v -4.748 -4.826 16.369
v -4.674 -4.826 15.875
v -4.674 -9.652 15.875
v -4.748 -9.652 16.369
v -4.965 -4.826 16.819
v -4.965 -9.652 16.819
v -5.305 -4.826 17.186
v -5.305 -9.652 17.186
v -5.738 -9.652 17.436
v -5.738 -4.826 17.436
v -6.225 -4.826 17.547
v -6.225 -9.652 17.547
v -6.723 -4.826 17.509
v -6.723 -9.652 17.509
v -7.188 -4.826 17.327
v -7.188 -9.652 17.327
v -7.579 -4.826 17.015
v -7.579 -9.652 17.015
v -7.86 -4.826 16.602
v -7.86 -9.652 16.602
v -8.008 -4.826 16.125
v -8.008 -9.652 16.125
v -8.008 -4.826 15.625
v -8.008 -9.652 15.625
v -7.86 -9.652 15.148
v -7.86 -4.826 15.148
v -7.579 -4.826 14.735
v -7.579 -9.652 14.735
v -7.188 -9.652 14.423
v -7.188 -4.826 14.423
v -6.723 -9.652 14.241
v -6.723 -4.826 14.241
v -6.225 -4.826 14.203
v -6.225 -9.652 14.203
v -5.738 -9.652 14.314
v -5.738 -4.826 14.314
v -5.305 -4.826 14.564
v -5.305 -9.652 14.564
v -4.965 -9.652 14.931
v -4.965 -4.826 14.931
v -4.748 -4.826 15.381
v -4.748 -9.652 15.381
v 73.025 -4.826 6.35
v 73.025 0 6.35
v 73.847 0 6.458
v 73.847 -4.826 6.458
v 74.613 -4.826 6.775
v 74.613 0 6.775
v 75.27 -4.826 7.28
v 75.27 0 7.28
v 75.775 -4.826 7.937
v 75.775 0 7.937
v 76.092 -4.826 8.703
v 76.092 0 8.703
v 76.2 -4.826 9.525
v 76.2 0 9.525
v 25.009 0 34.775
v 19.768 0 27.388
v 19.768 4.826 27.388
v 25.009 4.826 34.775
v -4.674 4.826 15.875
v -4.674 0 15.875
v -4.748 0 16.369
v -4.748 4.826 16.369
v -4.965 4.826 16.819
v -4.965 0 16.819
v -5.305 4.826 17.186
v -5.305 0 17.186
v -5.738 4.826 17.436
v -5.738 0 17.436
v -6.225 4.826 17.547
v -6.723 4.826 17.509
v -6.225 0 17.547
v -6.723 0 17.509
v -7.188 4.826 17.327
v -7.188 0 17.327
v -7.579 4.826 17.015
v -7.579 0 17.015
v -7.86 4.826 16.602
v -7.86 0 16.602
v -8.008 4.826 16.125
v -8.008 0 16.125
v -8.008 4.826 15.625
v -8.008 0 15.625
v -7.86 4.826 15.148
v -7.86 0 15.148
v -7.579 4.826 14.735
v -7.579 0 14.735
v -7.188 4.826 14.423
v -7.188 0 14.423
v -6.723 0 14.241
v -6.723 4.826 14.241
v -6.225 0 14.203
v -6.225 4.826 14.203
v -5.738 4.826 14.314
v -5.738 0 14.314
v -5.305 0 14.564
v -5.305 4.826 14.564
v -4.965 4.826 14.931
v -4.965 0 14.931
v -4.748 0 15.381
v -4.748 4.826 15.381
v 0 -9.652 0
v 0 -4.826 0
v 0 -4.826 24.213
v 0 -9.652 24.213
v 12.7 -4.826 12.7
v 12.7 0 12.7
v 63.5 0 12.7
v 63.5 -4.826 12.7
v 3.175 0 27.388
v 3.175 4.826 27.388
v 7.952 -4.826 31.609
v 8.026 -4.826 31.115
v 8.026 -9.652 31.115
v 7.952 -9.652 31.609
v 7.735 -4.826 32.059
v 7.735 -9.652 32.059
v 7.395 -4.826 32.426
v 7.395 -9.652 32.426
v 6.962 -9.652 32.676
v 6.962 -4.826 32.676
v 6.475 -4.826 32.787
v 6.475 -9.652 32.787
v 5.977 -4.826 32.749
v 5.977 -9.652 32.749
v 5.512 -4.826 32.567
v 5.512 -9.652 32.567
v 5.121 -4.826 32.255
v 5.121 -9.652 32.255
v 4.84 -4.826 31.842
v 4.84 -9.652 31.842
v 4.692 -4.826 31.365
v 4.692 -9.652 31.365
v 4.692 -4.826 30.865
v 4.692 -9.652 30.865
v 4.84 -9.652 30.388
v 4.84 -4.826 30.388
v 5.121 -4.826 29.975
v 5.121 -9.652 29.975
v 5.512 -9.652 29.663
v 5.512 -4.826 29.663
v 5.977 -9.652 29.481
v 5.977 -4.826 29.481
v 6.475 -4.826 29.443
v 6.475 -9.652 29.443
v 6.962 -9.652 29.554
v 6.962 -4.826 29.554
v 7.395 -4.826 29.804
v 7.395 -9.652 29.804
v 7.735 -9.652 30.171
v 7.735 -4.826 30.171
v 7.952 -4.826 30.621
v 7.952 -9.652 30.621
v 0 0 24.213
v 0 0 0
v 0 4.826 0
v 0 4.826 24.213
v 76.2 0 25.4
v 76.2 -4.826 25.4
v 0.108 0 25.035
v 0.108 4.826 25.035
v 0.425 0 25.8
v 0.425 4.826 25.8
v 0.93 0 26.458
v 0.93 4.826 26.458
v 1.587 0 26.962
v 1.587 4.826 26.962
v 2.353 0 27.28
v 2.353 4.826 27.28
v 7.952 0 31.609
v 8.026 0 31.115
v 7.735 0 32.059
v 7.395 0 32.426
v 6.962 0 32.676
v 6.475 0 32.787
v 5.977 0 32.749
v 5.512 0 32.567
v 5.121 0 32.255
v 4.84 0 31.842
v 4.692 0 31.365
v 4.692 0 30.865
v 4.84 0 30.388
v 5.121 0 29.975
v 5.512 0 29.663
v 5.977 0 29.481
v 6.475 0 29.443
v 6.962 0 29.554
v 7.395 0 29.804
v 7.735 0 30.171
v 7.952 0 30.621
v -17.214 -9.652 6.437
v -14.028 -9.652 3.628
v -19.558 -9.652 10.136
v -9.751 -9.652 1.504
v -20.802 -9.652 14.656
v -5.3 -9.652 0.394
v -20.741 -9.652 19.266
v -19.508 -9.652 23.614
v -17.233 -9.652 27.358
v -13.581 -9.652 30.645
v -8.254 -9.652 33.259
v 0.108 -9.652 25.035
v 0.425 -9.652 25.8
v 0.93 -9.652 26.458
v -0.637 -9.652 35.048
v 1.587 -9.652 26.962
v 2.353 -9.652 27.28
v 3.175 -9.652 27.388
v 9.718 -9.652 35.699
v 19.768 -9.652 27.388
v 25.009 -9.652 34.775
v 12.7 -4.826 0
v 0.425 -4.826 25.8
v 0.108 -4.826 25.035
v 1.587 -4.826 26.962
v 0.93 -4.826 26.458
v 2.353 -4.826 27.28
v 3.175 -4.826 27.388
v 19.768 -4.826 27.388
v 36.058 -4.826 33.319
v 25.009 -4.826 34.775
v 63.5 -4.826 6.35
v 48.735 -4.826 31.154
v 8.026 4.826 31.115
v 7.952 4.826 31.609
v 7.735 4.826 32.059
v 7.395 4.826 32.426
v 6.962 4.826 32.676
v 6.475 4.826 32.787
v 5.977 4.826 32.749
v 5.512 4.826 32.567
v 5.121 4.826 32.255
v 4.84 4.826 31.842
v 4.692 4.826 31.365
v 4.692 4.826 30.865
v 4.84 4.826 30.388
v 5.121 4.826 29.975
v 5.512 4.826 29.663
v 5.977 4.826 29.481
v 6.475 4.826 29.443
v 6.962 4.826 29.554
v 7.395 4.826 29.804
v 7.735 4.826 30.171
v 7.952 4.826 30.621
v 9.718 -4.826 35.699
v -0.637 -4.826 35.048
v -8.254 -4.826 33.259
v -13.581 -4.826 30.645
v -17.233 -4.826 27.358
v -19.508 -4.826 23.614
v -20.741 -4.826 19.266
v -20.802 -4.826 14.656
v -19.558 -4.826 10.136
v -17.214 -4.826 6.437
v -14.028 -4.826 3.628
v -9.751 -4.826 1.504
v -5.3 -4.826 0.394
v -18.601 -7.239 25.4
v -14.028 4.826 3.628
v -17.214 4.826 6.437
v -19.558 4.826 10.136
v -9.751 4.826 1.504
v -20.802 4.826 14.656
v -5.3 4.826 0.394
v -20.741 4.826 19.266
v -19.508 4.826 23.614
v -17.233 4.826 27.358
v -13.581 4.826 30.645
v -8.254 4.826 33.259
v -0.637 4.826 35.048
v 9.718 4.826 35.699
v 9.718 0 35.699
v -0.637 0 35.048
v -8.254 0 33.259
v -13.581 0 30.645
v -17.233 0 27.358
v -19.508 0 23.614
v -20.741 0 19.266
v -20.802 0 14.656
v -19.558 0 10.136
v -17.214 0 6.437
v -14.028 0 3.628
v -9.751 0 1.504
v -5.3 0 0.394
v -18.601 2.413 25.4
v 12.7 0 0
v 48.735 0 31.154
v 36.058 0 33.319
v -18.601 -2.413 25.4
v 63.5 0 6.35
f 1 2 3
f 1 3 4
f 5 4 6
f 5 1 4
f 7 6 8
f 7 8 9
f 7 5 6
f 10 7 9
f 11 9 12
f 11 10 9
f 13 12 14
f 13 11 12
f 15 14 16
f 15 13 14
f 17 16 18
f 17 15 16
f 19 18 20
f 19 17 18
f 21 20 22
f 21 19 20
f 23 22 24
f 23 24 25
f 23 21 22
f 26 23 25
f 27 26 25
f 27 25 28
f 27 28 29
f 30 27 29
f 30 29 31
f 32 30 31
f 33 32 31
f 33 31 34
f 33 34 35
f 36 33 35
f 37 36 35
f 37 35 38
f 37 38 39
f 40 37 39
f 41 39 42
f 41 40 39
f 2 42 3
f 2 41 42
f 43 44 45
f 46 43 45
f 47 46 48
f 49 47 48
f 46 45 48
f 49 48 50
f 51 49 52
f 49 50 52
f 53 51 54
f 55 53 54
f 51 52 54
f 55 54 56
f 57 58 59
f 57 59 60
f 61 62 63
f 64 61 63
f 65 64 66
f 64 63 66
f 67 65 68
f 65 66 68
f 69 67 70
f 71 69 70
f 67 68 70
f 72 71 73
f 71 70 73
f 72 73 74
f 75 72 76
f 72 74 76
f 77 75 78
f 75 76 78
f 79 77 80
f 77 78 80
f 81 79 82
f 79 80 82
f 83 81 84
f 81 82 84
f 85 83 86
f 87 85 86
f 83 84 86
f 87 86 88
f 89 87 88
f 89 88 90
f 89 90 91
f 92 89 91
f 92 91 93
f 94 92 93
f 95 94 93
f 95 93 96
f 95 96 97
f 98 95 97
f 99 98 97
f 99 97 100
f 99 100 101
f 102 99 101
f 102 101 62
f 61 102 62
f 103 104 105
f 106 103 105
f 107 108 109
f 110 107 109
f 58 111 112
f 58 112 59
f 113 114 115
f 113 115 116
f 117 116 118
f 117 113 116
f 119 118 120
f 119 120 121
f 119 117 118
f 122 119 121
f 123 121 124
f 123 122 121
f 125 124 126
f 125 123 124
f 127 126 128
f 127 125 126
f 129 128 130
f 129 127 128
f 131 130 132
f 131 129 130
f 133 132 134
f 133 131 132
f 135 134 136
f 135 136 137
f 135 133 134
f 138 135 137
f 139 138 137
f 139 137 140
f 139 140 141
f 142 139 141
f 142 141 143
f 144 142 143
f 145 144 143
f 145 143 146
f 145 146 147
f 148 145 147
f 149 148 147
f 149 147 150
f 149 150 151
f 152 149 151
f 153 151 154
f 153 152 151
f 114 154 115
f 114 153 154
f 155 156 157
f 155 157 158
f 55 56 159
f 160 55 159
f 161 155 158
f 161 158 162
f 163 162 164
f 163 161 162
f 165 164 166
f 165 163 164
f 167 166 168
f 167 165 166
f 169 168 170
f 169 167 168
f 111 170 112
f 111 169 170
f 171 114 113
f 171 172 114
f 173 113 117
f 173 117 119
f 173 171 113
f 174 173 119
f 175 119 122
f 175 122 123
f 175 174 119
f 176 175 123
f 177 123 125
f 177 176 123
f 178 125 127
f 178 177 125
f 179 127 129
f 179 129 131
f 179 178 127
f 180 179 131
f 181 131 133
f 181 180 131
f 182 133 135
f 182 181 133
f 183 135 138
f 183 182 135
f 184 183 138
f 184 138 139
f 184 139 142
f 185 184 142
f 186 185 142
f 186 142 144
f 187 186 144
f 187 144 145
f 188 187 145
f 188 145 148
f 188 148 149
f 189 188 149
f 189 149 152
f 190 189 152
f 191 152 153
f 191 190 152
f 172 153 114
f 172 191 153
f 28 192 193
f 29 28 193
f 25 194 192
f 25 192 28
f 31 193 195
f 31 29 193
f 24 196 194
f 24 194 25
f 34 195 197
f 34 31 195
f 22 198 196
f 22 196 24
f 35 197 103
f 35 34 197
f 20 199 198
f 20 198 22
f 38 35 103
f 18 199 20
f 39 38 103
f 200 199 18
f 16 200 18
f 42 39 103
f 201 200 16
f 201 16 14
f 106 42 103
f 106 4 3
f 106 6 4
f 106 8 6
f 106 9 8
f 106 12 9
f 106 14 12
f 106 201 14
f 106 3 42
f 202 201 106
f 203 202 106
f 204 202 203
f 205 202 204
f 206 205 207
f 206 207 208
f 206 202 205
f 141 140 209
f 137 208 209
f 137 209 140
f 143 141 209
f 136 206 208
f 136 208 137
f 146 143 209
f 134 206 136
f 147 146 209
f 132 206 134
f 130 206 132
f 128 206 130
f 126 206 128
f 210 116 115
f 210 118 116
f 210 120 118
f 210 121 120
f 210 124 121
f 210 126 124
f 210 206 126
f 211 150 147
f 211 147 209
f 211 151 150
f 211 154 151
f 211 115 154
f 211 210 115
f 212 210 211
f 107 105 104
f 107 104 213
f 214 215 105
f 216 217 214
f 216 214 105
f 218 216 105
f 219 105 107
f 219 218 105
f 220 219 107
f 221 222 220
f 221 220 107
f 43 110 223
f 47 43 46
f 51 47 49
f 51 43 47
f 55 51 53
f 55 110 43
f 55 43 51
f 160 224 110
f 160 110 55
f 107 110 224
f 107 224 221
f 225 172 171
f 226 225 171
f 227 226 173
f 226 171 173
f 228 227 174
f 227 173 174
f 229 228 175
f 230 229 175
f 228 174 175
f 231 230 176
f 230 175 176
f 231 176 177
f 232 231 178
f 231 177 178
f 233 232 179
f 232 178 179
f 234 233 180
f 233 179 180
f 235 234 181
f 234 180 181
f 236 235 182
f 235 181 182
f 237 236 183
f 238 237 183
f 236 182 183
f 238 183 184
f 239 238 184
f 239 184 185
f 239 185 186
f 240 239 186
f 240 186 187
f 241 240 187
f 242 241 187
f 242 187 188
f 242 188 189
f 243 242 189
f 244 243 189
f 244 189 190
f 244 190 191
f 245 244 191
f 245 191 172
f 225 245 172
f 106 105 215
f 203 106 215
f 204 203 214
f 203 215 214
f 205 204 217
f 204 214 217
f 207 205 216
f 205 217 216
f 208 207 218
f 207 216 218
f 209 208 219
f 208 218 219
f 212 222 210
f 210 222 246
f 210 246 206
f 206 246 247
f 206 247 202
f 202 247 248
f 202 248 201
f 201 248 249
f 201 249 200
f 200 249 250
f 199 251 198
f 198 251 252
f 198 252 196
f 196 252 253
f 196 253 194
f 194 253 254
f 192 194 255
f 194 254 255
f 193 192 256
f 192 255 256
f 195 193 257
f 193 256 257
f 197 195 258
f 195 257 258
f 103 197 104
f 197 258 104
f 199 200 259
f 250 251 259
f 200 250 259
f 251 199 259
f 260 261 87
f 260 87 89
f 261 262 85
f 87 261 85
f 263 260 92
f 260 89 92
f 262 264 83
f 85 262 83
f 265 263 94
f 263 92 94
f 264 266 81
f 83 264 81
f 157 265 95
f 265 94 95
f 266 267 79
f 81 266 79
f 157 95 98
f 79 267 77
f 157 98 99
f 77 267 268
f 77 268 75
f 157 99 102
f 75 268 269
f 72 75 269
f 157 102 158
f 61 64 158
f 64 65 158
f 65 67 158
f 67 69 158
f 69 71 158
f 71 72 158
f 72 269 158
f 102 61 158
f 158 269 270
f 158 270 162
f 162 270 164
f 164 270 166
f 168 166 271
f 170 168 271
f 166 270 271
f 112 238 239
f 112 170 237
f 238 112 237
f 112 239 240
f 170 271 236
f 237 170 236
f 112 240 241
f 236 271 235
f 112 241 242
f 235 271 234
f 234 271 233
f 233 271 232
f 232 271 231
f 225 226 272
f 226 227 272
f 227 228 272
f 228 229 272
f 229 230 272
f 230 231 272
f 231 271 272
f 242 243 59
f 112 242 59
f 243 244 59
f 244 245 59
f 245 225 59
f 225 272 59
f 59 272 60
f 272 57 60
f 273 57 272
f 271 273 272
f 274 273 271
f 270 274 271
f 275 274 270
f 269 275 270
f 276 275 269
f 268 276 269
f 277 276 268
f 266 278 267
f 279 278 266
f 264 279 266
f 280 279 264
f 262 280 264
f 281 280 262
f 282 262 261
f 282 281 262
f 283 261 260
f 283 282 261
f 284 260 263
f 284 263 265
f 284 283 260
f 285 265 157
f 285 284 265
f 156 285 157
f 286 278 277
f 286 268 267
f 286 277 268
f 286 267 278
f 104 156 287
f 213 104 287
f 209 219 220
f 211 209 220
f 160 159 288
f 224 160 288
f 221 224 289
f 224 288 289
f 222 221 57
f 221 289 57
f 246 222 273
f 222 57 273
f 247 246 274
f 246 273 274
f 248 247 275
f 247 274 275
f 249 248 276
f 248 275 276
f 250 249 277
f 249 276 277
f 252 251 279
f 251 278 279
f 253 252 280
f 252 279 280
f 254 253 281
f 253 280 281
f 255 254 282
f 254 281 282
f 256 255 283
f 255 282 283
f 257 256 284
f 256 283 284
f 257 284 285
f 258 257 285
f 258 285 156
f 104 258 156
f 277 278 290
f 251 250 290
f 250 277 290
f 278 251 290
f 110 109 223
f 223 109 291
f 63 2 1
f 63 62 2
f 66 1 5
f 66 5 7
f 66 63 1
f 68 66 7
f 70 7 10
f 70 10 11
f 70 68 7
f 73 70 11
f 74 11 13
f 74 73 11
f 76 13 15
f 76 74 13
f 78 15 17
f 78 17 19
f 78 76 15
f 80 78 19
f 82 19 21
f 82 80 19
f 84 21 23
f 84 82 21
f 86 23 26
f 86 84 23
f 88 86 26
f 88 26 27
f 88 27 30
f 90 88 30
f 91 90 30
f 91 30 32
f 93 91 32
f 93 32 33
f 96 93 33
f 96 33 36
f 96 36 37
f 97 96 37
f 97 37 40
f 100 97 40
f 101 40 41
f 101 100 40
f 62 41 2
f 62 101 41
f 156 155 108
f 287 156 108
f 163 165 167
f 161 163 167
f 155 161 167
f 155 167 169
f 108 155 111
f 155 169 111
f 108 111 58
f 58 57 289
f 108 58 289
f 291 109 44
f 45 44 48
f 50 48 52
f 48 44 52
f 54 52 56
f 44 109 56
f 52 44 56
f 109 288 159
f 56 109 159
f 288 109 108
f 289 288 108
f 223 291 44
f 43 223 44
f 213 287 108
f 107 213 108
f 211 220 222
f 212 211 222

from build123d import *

# Parameters (mm, degrees)
F0_R          = 1.6764
F1_DEPTH      = 4.826
F2_R          = 1.6764
F3_DEPTH      = 4.826
F3_DEPTH_BACK = 9.652


with BuildPart() as f1:
    # F0 (on Front) → F1 (new body)
    with BuildSketch(Plane.XZ):
        with BuildLine():
            Line((0, 25.4), (0, 0))
            Line((0, 0), (12.7, 0))
            Line((12.7, 0), (12.7, 12.7))
            Line((12.7, 12.7), (63.5, 12.7))
            Line((63.5, 12.7), (63.5, 6.35))
            Line((63.5, 6.35), (73.025, 6.35))
            ThreePointArc((73.025, 6.35), (75.2700640303, 7.2799359697), (76.2, 9.525))
            Line((76.2, 9.525), (76.2, 25.4))
            Line((76.2, 25.4), (0, 25.4))
        make_face()
        with BuildLine():
            add(Edge.make_bspline(
                [(76.2, 25.4), (26.6581273418, 36.622909108), (-29.7852053598, 44.2043974935), (-20.7405121115, 0), (0, 0)],
                knots=[0, 0, 0, 0, 0.6344075171, 1, 1, 1, 1], degree=3))
            Line((0, 0), (0, 25.4))
            Line((0, 25.4), (76.2, 25.4))
        make_face()
        with Locations((-6.35, 15.875)):
            Circle(F0_R, mode=Mode.SUBTRACT)
        with Locations((6.35, 31.115)):
            Circle(F0_R, mode=Mode.SUBTRACT)
    extrude(amount=F1_DEPTH)

    # F2 (on face) → F3 (join, two sides)
    with BuildSketch(Plane.XZ.offset(4.826)) as f3_sk:
        with BuildLine():
            Line((3.175, 27.3878005167), (19.7676480954, 27.3878005167))
            Line((19.7676480954, 27.3878005167), (25.0090726158, 34.7748551155))
            add(Edge.make_bspline(
                [(25.0090726158, 34.7748551155), (2.6249492009, 37.1897339417), (-27.5347979466, 33.2059146169), (-20.7405121115, 0), (0, 0)],
                knots=[0.2488096999, 0.2488096999, 0.2488096999, 0.2488096999, 0.6344075171, 1, 1, 1, 1], degree=3))
            Line((0, 0), (0, 24.2128005167))
            ThreePointArc((0, 24.2128005167), (0.9299359697, 26.457864547), (3.175, 27.3878005167))
        make_face()
        with Locations((-6.35, 15.875)):
            Circle(F2_R, mode=Mode.SUBTRACT)
        with Locations((6.35, 31.115)):
            Circle(F2_R, mode=Mode.SUBTRACT)
    extrude(amount=F3_DEPTH)
    extrude(f3_sk.sketch, amount=-F3_DEPTH_BACK)


solid = f1.part
